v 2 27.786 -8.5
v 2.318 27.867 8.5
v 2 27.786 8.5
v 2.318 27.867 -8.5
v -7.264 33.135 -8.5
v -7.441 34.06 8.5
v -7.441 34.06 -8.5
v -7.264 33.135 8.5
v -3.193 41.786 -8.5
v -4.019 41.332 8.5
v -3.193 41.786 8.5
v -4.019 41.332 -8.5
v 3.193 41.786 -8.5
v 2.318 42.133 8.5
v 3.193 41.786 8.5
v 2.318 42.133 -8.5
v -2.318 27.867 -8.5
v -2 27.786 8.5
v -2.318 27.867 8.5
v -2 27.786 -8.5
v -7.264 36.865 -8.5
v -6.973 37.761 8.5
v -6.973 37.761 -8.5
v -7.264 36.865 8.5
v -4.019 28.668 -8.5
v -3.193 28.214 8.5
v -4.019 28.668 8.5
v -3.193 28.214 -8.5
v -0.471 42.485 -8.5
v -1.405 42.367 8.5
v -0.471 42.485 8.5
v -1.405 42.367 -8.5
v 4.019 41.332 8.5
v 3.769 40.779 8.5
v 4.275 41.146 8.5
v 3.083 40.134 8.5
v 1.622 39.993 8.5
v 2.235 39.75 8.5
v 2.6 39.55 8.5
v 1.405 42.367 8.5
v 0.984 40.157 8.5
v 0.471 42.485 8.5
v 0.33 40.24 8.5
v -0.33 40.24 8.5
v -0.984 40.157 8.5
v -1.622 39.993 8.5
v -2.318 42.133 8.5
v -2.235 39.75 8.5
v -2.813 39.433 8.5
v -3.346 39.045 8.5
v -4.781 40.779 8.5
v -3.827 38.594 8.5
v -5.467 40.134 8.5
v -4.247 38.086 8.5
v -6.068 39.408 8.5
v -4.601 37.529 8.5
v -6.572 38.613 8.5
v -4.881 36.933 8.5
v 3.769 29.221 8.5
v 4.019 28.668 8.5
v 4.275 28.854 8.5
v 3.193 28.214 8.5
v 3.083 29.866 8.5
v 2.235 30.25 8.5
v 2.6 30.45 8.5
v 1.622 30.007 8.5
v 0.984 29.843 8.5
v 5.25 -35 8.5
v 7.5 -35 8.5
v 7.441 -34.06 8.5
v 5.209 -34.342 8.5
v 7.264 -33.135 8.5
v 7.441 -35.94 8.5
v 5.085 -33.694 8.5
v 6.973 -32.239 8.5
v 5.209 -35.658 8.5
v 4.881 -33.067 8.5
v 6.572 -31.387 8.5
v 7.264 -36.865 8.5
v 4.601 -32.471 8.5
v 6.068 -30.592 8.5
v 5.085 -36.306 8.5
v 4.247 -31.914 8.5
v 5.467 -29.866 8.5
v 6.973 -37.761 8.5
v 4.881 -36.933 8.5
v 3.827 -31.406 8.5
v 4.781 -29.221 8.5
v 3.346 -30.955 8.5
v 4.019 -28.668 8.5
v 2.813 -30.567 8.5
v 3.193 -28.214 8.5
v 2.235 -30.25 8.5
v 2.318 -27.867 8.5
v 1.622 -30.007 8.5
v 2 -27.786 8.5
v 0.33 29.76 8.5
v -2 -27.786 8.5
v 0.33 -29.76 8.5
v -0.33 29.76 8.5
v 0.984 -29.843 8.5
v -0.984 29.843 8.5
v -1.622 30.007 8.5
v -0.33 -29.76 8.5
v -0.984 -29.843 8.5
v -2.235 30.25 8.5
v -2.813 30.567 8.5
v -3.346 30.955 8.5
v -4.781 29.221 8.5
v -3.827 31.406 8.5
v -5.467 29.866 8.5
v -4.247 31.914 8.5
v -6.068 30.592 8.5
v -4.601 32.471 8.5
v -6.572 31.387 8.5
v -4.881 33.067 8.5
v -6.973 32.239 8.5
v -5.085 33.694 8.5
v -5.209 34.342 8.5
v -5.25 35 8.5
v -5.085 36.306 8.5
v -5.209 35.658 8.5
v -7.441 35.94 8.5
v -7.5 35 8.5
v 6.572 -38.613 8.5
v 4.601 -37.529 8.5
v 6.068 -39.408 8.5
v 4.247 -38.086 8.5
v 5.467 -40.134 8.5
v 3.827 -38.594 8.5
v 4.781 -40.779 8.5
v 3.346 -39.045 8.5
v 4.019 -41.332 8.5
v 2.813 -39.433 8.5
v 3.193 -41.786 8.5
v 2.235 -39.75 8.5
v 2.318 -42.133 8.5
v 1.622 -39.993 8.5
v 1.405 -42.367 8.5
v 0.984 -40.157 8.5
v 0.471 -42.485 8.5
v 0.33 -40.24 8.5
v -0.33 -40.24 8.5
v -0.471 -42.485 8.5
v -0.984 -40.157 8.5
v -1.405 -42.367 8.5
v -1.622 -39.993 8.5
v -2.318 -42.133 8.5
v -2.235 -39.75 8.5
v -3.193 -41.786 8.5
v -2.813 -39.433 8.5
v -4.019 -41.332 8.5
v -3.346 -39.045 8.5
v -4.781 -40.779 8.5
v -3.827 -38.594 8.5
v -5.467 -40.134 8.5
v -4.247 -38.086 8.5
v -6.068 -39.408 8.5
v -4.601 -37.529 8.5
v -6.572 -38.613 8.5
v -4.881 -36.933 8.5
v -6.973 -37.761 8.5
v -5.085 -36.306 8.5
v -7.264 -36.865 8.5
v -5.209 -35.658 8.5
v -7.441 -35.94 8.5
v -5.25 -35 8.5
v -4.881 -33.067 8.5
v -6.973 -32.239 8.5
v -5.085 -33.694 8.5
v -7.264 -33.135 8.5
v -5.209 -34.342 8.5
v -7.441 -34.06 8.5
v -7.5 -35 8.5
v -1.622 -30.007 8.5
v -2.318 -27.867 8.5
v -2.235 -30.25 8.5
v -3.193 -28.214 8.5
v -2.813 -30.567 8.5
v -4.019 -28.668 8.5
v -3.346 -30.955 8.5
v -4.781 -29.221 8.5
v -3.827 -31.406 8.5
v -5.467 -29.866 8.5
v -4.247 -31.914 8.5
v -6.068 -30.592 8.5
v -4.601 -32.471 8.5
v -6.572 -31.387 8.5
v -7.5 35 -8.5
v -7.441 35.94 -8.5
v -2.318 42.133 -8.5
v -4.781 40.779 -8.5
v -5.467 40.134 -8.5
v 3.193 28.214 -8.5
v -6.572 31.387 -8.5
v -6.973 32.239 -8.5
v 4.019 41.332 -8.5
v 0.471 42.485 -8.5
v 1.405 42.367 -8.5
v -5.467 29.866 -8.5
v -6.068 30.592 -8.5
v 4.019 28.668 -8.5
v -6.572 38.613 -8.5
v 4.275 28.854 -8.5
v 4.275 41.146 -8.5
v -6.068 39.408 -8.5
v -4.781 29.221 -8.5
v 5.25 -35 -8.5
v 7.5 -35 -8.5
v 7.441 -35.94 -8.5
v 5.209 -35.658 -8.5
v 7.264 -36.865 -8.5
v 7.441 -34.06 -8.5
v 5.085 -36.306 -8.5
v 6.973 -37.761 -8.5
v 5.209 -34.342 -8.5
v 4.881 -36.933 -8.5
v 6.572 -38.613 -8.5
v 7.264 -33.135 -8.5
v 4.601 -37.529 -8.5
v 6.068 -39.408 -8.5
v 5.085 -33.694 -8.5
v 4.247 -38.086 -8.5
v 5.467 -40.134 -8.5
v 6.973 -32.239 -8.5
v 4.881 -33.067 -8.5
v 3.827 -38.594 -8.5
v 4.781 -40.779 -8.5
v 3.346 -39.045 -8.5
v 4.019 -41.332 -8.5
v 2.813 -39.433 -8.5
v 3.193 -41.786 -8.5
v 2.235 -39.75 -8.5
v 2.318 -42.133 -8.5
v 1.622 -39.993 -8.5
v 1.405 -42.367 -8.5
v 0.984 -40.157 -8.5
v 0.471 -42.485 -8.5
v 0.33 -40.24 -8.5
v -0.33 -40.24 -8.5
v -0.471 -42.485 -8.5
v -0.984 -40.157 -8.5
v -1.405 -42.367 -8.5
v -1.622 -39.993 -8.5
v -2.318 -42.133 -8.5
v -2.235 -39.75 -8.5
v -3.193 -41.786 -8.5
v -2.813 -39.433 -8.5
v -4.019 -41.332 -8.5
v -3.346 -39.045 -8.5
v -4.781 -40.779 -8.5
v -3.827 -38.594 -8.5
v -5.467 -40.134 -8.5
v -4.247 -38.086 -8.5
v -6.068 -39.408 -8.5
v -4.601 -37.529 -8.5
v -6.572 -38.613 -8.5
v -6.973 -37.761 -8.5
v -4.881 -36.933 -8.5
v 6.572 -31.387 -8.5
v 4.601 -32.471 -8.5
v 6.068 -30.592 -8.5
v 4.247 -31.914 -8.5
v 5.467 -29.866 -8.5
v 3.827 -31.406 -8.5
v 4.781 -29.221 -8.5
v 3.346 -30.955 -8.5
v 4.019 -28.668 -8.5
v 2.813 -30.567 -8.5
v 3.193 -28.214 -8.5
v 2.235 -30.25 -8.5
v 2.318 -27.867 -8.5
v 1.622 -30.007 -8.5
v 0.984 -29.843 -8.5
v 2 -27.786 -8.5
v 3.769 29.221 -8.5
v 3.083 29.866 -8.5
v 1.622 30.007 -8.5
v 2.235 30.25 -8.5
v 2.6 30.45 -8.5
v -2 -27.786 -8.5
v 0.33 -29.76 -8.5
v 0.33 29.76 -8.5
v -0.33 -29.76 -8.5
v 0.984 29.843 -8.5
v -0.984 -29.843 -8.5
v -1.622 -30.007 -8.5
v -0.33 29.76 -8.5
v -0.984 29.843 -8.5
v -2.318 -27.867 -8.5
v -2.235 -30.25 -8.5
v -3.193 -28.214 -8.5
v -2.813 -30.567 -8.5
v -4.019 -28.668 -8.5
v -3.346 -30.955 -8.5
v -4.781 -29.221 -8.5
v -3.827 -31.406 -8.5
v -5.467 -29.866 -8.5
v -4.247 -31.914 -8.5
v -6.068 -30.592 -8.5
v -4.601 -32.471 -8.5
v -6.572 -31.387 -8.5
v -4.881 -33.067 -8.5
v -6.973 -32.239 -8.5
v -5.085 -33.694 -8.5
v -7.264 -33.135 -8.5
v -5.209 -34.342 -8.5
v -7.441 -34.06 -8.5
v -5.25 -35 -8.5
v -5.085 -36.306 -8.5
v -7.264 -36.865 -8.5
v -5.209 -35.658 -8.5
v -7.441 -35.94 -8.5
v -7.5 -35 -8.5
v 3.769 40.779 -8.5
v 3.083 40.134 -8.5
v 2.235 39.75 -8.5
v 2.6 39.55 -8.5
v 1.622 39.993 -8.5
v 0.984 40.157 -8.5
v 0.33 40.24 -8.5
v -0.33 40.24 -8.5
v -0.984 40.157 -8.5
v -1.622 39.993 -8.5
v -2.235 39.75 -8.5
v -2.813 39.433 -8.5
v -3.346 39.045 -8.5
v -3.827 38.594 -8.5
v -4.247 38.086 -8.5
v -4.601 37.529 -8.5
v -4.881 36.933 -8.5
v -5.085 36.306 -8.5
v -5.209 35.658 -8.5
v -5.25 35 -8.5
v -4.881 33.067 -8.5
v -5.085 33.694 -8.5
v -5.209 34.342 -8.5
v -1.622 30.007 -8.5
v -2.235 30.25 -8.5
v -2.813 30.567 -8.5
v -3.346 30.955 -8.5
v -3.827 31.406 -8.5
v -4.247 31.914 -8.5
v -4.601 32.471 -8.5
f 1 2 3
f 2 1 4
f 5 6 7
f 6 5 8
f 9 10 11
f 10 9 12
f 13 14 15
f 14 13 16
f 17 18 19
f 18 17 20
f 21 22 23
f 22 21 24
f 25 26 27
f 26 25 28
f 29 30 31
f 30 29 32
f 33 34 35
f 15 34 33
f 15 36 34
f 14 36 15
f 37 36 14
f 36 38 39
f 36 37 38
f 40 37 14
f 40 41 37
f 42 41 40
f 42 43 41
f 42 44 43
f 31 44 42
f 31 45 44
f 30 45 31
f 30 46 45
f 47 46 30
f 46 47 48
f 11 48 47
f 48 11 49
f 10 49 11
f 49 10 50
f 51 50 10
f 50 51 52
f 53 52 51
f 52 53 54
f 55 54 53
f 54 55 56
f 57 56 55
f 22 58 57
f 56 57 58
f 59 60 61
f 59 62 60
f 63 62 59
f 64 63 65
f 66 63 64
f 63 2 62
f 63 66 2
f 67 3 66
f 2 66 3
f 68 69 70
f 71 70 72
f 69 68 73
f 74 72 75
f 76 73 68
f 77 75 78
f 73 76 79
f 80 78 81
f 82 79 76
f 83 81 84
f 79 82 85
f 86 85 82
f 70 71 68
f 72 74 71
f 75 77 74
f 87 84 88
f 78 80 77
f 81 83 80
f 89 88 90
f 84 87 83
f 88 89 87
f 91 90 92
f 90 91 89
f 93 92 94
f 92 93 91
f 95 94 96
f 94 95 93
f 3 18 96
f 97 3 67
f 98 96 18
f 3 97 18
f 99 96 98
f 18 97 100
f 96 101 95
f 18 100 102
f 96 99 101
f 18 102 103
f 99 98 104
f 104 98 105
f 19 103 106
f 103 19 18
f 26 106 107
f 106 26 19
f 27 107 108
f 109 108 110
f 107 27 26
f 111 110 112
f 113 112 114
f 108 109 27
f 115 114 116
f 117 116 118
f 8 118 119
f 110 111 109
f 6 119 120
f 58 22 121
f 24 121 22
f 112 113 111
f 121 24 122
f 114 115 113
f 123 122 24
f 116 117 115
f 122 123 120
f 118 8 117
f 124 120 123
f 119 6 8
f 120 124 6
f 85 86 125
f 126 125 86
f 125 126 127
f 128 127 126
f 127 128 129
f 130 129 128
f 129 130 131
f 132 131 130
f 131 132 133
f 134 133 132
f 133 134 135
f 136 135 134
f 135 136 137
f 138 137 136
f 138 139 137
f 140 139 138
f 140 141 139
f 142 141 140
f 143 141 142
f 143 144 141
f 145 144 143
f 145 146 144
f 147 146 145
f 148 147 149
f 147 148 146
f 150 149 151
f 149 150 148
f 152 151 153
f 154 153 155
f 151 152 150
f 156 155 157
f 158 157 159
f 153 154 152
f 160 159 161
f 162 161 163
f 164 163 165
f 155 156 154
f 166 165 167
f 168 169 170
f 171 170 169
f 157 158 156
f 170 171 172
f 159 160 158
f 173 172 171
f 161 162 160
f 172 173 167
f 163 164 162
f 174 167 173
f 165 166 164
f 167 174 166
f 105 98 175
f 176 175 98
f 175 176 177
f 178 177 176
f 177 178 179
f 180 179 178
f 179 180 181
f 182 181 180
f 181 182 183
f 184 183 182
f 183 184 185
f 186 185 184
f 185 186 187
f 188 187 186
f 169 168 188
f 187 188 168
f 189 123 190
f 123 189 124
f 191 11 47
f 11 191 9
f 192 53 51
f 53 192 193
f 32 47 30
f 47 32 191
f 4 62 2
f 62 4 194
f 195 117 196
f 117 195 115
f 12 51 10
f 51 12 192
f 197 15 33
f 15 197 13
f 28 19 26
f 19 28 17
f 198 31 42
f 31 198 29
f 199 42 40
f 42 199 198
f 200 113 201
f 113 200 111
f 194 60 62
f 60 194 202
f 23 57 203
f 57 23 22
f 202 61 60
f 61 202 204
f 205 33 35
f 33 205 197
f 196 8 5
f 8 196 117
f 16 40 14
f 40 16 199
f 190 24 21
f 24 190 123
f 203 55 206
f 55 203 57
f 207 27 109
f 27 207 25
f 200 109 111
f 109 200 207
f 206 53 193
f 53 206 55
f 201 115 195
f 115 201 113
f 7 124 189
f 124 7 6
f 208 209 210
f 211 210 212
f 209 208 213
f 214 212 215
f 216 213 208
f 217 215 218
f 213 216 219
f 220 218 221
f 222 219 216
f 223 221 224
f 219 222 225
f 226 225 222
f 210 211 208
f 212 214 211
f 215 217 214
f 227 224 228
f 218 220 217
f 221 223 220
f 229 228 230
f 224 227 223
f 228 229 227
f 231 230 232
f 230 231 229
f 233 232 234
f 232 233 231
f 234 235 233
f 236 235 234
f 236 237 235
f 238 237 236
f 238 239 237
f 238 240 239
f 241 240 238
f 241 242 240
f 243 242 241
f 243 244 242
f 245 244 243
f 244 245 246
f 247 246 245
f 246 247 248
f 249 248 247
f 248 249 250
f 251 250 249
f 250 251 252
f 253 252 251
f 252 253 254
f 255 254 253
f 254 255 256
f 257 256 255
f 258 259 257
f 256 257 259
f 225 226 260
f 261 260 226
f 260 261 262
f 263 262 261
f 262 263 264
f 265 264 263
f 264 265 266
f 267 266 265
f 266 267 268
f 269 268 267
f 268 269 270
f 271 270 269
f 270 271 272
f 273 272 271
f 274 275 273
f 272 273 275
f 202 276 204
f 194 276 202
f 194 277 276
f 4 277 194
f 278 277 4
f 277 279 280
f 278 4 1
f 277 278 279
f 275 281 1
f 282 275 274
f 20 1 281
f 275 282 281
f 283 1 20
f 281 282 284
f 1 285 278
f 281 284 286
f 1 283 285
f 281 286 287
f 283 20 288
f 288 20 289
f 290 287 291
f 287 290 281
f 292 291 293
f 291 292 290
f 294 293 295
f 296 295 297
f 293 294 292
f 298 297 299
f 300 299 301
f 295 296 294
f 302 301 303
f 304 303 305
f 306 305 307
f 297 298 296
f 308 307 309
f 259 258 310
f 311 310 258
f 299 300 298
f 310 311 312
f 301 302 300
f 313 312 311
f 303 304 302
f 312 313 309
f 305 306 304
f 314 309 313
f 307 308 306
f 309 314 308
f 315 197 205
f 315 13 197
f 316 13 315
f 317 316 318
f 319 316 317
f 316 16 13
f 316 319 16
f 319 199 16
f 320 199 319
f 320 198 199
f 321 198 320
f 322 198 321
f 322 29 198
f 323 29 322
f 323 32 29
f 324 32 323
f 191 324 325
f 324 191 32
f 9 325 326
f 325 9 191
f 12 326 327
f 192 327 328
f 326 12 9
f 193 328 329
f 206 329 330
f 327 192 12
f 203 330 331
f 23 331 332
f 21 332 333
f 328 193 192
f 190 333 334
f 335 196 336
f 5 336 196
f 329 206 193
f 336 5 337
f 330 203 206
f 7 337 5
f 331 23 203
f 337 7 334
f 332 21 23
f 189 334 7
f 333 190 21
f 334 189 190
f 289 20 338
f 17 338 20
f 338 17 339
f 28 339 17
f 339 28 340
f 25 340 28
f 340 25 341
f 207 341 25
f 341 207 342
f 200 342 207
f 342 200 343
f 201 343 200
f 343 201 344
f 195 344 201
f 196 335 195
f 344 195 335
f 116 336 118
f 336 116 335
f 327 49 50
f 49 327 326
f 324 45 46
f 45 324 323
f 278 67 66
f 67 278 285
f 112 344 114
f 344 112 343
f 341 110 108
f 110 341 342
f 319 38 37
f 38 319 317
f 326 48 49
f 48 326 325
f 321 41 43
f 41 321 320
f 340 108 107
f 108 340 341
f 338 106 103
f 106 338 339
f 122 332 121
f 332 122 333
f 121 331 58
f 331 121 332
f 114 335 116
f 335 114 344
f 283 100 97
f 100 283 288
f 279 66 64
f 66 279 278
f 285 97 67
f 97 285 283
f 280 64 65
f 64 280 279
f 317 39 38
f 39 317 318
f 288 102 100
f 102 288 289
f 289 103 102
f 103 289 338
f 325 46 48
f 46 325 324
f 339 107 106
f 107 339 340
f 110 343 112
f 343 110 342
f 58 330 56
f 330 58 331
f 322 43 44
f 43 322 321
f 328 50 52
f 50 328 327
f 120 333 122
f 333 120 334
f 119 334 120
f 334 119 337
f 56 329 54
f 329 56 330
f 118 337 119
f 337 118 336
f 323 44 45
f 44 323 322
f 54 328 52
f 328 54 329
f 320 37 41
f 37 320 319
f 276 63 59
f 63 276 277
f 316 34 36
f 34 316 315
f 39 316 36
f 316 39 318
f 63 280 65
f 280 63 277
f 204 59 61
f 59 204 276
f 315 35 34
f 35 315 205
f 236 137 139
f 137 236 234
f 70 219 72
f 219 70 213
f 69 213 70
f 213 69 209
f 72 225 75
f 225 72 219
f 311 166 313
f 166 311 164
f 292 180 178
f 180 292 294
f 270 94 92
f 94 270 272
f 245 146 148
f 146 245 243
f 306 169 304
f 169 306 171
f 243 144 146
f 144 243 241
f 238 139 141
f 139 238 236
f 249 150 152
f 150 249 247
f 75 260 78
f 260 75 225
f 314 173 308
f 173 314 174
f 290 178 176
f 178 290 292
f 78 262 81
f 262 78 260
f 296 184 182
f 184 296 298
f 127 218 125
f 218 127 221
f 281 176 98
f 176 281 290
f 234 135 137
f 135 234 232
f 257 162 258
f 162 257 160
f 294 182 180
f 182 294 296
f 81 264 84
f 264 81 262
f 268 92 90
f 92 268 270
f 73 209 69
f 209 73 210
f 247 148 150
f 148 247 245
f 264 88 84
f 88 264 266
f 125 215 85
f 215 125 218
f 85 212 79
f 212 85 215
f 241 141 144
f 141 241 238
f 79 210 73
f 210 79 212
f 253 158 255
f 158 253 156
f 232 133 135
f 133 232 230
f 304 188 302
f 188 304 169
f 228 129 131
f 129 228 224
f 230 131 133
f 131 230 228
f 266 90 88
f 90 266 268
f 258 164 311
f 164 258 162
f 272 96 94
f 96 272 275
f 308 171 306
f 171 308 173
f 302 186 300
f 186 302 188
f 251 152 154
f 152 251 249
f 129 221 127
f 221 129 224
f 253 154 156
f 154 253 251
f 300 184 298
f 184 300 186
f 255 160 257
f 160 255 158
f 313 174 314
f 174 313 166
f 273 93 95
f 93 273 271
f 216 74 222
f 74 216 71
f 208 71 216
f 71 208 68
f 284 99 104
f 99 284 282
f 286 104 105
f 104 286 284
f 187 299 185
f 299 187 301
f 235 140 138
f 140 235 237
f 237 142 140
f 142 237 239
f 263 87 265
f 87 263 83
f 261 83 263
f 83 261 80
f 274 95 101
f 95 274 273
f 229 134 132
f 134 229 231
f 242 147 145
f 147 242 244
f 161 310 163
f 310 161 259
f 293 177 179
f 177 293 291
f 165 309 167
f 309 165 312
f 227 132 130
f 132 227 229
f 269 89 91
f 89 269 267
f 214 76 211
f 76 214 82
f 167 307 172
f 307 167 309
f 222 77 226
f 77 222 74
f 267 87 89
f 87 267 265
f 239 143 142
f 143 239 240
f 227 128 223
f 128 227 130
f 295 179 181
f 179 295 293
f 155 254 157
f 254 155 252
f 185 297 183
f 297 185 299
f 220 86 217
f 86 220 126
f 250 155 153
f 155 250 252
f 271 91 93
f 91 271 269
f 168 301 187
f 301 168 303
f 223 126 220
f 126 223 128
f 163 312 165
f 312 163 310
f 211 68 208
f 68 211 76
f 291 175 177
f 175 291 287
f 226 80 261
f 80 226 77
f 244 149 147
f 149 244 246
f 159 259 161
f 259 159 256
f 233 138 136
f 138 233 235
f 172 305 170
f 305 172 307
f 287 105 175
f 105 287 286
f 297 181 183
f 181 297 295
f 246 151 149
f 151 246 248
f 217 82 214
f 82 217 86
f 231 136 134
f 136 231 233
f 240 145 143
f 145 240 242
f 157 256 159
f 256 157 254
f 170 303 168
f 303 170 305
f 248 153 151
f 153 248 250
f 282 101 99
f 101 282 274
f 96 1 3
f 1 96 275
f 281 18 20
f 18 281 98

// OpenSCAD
$fn = 50;

cylinder_in_d = 10.5;
cylinder_h = 17;
cylinder_out_d = 15;

distance = 55;
d_wall = 4;

cylinder_wall = cylinder_out_d -cylinder_in_d;

module cylinder_mount() {
    difference() {
        cylinder(h=cylinder_h, d=cylinder_out_d, center=true);
        cylinder(h=cylinder_h, d=cylinder_in_d, center=true);
    }
}

module cylinder_mount_cut() {
    difference() {
        cylinder(h=cylinder_h, d=cylinder_out_d, center=true);
        cylinder(h=cylinder_h, d=cylinder_in_d, center=true);
        translate([0.57*cylinder_out_d, 0, 0]) cylinder(h=cylinder_h, d=cylinder_out_d, center=true);
    }
}

translate([0, 0.5*(distance+cylinder_out_d), 0]) cylinder_mount_cut();
cube([d_wall, distance + cylinder_wall, cylinder_h], center=true);
translate([0, -0.5*(distance+cylinder_out_d), 0]) cylinder_mount();
